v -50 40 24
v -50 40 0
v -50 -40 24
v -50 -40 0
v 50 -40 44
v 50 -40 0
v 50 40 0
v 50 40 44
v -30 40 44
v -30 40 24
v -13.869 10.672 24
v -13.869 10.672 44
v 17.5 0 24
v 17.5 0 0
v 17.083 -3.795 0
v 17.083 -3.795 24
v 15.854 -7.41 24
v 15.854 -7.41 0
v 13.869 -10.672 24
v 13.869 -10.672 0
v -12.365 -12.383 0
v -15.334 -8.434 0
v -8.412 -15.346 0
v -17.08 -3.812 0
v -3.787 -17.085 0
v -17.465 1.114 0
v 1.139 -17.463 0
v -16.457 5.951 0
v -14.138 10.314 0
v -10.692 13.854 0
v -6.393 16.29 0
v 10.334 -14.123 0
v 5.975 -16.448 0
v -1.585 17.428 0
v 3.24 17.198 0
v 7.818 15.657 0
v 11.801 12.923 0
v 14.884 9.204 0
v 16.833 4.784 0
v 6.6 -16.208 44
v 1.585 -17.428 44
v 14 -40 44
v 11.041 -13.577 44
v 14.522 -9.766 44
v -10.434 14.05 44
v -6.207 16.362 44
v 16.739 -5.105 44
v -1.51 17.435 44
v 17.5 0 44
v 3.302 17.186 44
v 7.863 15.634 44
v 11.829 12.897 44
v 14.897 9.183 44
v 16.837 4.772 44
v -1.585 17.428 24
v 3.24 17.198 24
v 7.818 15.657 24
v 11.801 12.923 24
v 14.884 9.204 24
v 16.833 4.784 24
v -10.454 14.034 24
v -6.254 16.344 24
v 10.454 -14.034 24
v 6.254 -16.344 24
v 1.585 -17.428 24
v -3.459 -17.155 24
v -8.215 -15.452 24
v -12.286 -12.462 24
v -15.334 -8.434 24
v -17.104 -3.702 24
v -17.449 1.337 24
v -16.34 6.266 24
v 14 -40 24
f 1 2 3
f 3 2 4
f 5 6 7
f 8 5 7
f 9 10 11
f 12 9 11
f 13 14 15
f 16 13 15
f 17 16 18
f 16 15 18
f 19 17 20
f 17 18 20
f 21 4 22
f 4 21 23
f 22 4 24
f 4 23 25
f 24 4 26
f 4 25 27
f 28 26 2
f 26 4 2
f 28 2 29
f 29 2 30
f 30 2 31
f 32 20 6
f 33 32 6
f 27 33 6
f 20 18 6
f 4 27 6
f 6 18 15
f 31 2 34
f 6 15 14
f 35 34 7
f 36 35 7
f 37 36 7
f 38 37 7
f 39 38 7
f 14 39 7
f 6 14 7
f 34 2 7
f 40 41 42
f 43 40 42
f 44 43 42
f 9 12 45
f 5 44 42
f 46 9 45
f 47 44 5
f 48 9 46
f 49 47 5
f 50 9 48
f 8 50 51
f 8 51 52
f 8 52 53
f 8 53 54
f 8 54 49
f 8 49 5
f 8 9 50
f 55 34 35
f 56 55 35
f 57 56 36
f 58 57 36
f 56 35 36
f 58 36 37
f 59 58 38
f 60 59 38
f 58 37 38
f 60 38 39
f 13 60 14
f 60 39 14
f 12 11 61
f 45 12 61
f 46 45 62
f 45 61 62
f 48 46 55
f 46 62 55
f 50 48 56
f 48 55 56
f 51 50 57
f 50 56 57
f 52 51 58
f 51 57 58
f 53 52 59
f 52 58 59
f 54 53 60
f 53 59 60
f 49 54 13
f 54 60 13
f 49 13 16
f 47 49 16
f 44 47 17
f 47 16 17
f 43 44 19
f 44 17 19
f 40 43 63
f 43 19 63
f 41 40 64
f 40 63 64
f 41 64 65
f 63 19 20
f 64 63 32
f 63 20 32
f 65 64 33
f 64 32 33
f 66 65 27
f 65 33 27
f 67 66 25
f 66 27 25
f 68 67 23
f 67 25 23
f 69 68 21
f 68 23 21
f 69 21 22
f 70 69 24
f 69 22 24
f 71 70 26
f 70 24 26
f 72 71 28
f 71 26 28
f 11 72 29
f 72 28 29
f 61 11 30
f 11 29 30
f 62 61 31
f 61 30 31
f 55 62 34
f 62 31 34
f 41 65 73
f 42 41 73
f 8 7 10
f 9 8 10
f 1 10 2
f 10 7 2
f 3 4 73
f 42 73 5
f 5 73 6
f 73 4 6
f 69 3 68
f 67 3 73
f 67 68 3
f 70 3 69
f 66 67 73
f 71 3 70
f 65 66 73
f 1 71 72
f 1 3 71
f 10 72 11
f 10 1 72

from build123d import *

# Parameters (mm, degrees)
F1_DEPTH = 24
F3_DEPTH = 20


with BuildPart() as f1:
    # F0 (on Top) → F1 (new body)
    with BuildSketch(Plane.XY):
        with BuildLine():
            Line((-1.58542, 17.428036), (-14, 40))
            Line((-14, 40), (-50, 40))
            Line((-50, 40), (-50, -40))
            Line((-50, -40), (30, -40))
            Line((30, -40), (13.869489, -10.671798))
            ThreePointArc((13.869489, -10.671798), (-15.333778, -8.433578), (-1.58542, 17.428036))
        make_face()
        with BuildLine():
            Line((50, -40), (50, 40))
            Line((50, 40), (-14, 40))
            Line((-14, 40), (-1.58542, 17.428036))
            ThreePointArc((-1.58542, 17.428036), (11.800533, 12.922748), (17.5, 0))
            ThreePointArc((17.5, 0), (16.567529, -5.63622), (13.869489, -10.671798))
            Line((13.869489, -10.671798), (30, -40))
            Line((30, -40), (50, -40))
        make_face()
    extrude(amount=F1_DEPTH)

    # F2 (on face) → F3 (join)
    with BuildSketch(Plane.XY.offset(24)):
        with BuildLine():
            Line((50, 40), (-30, 40))
            Line((-30, 40), (-13.869489, 10.671798))
            ThreePointArc((-13.869489, 10.671798), (5.63622, 16.567529), (17.5, 0))
            ThreePointArc((17.5, 0), (12.922748, -11.800533), (1.58542, -17.428036))
            Line((1.58542, -17.428036), (14, -40))
            Line((14, -40), (50, -40))
            Line((50, -40), (50, 40))
        make_face()
    extrude(amount=F3_DEPTH)


solid = f1.part
